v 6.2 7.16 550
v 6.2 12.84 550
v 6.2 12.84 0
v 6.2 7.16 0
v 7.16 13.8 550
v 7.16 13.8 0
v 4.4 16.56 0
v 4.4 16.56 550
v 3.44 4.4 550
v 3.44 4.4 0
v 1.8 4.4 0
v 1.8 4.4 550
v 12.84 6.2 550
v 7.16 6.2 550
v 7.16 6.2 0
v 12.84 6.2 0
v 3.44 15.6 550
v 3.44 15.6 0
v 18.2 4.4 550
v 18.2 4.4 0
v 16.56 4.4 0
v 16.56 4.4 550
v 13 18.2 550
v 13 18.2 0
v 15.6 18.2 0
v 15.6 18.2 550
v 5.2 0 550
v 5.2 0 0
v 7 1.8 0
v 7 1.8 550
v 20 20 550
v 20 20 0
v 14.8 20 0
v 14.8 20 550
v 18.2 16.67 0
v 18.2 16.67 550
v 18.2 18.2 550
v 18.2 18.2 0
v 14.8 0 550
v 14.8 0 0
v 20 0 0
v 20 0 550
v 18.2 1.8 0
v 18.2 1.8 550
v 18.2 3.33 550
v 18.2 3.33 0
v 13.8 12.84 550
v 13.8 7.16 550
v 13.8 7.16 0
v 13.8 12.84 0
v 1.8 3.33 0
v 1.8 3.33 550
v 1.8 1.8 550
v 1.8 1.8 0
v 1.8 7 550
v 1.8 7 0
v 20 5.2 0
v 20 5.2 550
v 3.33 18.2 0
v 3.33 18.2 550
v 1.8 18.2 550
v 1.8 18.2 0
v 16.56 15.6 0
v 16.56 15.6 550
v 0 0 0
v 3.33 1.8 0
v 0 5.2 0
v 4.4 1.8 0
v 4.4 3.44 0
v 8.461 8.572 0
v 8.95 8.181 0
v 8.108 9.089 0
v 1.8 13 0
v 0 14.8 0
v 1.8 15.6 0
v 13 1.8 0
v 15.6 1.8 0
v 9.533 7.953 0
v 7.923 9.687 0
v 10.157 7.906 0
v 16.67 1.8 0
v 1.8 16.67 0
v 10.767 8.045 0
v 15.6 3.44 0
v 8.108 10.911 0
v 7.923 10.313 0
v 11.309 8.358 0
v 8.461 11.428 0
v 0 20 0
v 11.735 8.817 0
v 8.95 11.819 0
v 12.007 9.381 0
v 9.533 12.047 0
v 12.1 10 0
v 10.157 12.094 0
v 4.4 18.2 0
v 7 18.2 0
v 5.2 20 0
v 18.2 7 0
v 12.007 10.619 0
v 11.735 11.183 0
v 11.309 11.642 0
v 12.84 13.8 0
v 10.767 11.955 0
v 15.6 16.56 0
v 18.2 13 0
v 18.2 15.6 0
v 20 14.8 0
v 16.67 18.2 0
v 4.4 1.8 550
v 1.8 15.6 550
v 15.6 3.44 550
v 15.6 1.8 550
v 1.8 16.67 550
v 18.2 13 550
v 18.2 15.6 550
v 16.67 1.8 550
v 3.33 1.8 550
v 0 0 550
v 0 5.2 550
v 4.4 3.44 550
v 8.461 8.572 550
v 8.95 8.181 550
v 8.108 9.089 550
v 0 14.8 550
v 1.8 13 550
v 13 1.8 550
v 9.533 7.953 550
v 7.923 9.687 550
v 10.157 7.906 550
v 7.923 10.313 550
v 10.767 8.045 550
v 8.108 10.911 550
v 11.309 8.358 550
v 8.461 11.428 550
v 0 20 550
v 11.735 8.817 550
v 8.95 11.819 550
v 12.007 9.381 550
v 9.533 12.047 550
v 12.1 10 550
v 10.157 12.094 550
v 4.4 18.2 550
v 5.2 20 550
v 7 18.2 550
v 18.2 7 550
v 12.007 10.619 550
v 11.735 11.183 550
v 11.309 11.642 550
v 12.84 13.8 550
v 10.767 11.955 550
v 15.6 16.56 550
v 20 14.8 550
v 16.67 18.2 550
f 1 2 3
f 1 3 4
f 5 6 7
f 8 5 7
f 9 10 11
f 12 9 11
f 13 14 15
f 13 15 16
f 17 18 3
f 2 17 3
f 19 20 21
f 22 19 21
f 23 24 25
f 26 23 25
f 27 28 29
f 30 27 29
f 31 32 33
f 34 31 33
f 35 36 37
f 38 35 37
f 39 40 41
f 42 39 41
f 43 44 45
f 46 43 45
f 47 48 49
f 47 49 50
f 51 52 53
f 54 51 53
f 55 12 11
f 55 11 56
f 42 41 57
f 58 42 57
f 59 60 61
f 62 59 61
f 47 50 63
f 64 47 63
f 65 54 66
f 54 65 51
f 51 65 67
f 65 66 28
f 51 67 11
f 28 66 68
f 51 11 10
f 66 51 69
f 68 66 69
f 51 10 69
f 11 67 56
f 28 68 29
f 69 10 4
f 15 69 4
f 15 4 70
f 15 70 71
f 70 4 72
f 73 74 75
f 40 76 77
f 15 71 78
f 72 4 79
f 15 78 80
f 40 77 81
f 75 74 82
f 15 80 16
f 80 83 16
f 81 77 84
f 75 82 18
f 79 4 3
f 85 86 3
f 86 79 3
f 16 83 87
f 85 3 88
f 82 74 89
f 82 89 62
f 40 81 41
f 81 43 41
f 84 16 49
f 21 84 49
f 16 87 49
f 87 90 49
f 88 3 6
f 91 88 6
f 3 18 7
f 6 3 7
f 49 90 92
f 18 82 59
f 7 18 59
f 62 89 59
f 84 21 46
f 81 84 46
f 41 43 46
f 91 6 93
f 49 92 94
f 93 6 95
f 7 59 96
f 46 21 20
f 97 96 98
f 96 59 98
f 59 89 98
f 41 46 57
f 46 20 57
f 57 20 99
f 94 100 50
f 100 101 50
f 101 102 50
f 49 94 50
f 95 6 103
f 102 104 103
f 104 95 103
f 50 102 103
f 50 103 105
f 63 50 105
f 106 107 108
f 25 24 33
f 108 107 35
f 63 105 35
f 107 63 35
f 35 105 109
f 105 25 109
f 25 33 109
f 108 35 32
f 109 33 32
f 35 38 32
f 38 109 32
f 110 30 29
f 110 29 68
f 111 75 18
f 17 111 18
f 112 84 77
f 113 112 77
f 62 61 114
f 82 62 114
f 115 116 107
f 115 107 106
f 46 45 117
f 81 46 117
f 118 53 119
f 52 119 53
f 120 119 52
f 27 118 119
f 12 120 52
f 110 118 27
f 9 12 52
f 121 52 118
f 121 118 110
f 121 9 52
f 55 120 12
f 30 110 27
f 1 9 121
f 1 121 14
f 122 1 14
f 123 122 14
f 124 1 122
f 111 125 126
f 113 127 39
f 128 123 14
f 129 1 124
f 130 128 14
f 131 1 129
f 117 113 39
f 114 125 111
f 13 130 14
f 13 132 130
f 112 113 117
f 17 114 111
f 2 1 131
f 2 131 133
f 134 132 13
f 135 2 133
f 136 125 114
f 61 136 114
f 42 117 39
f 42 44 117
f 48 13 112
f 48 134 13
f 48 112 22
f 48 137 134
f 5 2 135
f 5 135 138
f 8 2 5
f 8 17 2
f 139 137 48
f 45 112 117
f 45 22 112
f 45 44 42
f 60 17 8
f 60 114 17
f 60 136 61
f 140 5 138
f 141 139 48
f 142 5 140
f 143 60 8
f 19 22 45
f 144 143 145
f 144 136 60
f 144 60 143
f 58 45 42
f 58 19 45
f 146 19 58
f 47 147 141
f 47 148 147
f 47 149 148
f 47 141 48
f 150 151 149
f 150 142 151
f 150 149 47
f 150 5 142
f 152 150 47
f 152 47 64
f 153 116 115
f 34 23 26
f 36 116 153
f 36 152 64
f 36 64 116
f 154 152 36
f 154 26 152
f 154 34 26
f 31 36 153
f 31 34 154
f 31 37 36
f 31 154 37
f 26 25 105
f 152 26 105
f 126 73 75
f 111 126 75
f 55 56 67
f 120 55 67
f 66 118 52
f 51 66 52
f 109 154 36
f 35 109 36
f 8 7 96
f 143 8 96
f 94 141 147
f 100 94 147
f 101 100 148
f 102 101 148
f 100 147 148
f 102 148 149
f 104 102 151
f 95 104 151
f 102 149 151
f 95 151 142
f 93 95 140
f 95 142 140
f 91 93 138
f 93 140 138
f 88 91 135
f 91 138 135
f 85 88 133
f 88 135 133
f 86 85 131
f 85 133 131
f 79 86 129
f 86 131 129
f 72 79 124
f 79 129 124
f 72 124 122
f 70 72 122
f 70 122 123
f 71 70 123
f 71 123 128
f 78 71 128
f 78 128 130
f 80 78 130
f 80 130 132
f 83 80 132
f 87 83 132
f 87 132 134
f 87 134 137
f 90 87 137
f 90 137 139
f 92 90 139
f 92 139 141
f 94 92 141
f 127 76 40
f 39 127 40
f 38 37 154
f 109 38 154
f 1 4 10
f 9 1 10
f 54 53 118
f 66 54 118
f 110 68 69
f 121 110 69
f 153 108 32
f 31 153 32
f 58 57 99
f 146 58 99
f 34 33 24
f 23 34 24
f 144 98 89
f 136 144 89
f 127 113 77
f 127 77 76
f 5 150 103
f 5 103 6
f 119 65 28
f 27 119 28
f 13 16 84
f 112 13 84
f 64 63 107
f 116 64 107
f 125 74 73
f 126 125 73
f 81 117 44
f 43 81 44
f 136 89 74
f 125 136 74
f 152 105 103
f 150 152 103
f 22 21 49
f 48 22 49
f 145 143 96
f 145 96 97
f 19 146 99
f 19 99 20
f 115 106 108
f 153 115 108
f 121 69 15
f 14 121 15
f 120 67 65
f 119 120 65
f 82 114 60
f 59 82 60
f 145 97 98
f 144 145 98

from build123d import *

# Parameters (mm, degrees)
F1_DEPTH = 550
F2_R     = 2.1
F3_DEPTH = 550.001


with BuildPart() as f1:
    # F0 (on Top) → F1 (new body)
    with BuildSketch(Plane.XY):
        Polygon((0, 5.2), (0, 0), (5.2, 0), (7, 1.8), (4.4, 1.8), (4.4, 3.44), (7.16, 6.2), (12.84, 6.2), (15.6, 3.44), (15.6, 1.8), (13, 1.8), (14.8, 0), (20, 0), (20, 5.2), (18.2, 7), (18.2, 4.4), (16.56, 4.4), (13.8, 7.16), (13.8, 12.84), (16.56, 15.6), (18.2, 15.6), (18.2, 13), (20, 14.8), (20, 20), (14.8, 20), (13, 18.2), (15.6, 18.2), (15.6, 16.56), (12.84, 13.8), (7.16, 13.8), (4.4, 16.56), (4.4, 18.2), (7, 18.2), (5.2, 20), (0, 20), (0, 14.8), (1.8, 13), (1.8, 15.6), (3.44, 15.6), (6.2, 12.84), (6.2, 7.16), (3.44, 4.4), (1.8, 4.4), (1.8, 7), align=None)
    extrude(amount=F1_DEPTH)

    # F2 (on face) → F3 (cut, through all)
    with BuildSketch(Plane.XY.offset(550)):
        with Locations((10, 10)):
            Circle(F2_R)
        Polygon((18.2, 16.67), (18.2, 18.2), (16.67, 18.2), align=None)
        Polygon((3.33, 18.2), (1.8, 18.2), (1.8, 16.67), align=None)
        Polygon((1.8, 3.33), (1.8, 1.8), (3.33, 1.8), align=None)
        Polygon((16.67, 1.8), (18.2, 1.8), (18.2, 3.33), align=None)
    extrude(amount=-F3_DEPTH, mode=Mode.SUBTRACT)


solid = f1.part
